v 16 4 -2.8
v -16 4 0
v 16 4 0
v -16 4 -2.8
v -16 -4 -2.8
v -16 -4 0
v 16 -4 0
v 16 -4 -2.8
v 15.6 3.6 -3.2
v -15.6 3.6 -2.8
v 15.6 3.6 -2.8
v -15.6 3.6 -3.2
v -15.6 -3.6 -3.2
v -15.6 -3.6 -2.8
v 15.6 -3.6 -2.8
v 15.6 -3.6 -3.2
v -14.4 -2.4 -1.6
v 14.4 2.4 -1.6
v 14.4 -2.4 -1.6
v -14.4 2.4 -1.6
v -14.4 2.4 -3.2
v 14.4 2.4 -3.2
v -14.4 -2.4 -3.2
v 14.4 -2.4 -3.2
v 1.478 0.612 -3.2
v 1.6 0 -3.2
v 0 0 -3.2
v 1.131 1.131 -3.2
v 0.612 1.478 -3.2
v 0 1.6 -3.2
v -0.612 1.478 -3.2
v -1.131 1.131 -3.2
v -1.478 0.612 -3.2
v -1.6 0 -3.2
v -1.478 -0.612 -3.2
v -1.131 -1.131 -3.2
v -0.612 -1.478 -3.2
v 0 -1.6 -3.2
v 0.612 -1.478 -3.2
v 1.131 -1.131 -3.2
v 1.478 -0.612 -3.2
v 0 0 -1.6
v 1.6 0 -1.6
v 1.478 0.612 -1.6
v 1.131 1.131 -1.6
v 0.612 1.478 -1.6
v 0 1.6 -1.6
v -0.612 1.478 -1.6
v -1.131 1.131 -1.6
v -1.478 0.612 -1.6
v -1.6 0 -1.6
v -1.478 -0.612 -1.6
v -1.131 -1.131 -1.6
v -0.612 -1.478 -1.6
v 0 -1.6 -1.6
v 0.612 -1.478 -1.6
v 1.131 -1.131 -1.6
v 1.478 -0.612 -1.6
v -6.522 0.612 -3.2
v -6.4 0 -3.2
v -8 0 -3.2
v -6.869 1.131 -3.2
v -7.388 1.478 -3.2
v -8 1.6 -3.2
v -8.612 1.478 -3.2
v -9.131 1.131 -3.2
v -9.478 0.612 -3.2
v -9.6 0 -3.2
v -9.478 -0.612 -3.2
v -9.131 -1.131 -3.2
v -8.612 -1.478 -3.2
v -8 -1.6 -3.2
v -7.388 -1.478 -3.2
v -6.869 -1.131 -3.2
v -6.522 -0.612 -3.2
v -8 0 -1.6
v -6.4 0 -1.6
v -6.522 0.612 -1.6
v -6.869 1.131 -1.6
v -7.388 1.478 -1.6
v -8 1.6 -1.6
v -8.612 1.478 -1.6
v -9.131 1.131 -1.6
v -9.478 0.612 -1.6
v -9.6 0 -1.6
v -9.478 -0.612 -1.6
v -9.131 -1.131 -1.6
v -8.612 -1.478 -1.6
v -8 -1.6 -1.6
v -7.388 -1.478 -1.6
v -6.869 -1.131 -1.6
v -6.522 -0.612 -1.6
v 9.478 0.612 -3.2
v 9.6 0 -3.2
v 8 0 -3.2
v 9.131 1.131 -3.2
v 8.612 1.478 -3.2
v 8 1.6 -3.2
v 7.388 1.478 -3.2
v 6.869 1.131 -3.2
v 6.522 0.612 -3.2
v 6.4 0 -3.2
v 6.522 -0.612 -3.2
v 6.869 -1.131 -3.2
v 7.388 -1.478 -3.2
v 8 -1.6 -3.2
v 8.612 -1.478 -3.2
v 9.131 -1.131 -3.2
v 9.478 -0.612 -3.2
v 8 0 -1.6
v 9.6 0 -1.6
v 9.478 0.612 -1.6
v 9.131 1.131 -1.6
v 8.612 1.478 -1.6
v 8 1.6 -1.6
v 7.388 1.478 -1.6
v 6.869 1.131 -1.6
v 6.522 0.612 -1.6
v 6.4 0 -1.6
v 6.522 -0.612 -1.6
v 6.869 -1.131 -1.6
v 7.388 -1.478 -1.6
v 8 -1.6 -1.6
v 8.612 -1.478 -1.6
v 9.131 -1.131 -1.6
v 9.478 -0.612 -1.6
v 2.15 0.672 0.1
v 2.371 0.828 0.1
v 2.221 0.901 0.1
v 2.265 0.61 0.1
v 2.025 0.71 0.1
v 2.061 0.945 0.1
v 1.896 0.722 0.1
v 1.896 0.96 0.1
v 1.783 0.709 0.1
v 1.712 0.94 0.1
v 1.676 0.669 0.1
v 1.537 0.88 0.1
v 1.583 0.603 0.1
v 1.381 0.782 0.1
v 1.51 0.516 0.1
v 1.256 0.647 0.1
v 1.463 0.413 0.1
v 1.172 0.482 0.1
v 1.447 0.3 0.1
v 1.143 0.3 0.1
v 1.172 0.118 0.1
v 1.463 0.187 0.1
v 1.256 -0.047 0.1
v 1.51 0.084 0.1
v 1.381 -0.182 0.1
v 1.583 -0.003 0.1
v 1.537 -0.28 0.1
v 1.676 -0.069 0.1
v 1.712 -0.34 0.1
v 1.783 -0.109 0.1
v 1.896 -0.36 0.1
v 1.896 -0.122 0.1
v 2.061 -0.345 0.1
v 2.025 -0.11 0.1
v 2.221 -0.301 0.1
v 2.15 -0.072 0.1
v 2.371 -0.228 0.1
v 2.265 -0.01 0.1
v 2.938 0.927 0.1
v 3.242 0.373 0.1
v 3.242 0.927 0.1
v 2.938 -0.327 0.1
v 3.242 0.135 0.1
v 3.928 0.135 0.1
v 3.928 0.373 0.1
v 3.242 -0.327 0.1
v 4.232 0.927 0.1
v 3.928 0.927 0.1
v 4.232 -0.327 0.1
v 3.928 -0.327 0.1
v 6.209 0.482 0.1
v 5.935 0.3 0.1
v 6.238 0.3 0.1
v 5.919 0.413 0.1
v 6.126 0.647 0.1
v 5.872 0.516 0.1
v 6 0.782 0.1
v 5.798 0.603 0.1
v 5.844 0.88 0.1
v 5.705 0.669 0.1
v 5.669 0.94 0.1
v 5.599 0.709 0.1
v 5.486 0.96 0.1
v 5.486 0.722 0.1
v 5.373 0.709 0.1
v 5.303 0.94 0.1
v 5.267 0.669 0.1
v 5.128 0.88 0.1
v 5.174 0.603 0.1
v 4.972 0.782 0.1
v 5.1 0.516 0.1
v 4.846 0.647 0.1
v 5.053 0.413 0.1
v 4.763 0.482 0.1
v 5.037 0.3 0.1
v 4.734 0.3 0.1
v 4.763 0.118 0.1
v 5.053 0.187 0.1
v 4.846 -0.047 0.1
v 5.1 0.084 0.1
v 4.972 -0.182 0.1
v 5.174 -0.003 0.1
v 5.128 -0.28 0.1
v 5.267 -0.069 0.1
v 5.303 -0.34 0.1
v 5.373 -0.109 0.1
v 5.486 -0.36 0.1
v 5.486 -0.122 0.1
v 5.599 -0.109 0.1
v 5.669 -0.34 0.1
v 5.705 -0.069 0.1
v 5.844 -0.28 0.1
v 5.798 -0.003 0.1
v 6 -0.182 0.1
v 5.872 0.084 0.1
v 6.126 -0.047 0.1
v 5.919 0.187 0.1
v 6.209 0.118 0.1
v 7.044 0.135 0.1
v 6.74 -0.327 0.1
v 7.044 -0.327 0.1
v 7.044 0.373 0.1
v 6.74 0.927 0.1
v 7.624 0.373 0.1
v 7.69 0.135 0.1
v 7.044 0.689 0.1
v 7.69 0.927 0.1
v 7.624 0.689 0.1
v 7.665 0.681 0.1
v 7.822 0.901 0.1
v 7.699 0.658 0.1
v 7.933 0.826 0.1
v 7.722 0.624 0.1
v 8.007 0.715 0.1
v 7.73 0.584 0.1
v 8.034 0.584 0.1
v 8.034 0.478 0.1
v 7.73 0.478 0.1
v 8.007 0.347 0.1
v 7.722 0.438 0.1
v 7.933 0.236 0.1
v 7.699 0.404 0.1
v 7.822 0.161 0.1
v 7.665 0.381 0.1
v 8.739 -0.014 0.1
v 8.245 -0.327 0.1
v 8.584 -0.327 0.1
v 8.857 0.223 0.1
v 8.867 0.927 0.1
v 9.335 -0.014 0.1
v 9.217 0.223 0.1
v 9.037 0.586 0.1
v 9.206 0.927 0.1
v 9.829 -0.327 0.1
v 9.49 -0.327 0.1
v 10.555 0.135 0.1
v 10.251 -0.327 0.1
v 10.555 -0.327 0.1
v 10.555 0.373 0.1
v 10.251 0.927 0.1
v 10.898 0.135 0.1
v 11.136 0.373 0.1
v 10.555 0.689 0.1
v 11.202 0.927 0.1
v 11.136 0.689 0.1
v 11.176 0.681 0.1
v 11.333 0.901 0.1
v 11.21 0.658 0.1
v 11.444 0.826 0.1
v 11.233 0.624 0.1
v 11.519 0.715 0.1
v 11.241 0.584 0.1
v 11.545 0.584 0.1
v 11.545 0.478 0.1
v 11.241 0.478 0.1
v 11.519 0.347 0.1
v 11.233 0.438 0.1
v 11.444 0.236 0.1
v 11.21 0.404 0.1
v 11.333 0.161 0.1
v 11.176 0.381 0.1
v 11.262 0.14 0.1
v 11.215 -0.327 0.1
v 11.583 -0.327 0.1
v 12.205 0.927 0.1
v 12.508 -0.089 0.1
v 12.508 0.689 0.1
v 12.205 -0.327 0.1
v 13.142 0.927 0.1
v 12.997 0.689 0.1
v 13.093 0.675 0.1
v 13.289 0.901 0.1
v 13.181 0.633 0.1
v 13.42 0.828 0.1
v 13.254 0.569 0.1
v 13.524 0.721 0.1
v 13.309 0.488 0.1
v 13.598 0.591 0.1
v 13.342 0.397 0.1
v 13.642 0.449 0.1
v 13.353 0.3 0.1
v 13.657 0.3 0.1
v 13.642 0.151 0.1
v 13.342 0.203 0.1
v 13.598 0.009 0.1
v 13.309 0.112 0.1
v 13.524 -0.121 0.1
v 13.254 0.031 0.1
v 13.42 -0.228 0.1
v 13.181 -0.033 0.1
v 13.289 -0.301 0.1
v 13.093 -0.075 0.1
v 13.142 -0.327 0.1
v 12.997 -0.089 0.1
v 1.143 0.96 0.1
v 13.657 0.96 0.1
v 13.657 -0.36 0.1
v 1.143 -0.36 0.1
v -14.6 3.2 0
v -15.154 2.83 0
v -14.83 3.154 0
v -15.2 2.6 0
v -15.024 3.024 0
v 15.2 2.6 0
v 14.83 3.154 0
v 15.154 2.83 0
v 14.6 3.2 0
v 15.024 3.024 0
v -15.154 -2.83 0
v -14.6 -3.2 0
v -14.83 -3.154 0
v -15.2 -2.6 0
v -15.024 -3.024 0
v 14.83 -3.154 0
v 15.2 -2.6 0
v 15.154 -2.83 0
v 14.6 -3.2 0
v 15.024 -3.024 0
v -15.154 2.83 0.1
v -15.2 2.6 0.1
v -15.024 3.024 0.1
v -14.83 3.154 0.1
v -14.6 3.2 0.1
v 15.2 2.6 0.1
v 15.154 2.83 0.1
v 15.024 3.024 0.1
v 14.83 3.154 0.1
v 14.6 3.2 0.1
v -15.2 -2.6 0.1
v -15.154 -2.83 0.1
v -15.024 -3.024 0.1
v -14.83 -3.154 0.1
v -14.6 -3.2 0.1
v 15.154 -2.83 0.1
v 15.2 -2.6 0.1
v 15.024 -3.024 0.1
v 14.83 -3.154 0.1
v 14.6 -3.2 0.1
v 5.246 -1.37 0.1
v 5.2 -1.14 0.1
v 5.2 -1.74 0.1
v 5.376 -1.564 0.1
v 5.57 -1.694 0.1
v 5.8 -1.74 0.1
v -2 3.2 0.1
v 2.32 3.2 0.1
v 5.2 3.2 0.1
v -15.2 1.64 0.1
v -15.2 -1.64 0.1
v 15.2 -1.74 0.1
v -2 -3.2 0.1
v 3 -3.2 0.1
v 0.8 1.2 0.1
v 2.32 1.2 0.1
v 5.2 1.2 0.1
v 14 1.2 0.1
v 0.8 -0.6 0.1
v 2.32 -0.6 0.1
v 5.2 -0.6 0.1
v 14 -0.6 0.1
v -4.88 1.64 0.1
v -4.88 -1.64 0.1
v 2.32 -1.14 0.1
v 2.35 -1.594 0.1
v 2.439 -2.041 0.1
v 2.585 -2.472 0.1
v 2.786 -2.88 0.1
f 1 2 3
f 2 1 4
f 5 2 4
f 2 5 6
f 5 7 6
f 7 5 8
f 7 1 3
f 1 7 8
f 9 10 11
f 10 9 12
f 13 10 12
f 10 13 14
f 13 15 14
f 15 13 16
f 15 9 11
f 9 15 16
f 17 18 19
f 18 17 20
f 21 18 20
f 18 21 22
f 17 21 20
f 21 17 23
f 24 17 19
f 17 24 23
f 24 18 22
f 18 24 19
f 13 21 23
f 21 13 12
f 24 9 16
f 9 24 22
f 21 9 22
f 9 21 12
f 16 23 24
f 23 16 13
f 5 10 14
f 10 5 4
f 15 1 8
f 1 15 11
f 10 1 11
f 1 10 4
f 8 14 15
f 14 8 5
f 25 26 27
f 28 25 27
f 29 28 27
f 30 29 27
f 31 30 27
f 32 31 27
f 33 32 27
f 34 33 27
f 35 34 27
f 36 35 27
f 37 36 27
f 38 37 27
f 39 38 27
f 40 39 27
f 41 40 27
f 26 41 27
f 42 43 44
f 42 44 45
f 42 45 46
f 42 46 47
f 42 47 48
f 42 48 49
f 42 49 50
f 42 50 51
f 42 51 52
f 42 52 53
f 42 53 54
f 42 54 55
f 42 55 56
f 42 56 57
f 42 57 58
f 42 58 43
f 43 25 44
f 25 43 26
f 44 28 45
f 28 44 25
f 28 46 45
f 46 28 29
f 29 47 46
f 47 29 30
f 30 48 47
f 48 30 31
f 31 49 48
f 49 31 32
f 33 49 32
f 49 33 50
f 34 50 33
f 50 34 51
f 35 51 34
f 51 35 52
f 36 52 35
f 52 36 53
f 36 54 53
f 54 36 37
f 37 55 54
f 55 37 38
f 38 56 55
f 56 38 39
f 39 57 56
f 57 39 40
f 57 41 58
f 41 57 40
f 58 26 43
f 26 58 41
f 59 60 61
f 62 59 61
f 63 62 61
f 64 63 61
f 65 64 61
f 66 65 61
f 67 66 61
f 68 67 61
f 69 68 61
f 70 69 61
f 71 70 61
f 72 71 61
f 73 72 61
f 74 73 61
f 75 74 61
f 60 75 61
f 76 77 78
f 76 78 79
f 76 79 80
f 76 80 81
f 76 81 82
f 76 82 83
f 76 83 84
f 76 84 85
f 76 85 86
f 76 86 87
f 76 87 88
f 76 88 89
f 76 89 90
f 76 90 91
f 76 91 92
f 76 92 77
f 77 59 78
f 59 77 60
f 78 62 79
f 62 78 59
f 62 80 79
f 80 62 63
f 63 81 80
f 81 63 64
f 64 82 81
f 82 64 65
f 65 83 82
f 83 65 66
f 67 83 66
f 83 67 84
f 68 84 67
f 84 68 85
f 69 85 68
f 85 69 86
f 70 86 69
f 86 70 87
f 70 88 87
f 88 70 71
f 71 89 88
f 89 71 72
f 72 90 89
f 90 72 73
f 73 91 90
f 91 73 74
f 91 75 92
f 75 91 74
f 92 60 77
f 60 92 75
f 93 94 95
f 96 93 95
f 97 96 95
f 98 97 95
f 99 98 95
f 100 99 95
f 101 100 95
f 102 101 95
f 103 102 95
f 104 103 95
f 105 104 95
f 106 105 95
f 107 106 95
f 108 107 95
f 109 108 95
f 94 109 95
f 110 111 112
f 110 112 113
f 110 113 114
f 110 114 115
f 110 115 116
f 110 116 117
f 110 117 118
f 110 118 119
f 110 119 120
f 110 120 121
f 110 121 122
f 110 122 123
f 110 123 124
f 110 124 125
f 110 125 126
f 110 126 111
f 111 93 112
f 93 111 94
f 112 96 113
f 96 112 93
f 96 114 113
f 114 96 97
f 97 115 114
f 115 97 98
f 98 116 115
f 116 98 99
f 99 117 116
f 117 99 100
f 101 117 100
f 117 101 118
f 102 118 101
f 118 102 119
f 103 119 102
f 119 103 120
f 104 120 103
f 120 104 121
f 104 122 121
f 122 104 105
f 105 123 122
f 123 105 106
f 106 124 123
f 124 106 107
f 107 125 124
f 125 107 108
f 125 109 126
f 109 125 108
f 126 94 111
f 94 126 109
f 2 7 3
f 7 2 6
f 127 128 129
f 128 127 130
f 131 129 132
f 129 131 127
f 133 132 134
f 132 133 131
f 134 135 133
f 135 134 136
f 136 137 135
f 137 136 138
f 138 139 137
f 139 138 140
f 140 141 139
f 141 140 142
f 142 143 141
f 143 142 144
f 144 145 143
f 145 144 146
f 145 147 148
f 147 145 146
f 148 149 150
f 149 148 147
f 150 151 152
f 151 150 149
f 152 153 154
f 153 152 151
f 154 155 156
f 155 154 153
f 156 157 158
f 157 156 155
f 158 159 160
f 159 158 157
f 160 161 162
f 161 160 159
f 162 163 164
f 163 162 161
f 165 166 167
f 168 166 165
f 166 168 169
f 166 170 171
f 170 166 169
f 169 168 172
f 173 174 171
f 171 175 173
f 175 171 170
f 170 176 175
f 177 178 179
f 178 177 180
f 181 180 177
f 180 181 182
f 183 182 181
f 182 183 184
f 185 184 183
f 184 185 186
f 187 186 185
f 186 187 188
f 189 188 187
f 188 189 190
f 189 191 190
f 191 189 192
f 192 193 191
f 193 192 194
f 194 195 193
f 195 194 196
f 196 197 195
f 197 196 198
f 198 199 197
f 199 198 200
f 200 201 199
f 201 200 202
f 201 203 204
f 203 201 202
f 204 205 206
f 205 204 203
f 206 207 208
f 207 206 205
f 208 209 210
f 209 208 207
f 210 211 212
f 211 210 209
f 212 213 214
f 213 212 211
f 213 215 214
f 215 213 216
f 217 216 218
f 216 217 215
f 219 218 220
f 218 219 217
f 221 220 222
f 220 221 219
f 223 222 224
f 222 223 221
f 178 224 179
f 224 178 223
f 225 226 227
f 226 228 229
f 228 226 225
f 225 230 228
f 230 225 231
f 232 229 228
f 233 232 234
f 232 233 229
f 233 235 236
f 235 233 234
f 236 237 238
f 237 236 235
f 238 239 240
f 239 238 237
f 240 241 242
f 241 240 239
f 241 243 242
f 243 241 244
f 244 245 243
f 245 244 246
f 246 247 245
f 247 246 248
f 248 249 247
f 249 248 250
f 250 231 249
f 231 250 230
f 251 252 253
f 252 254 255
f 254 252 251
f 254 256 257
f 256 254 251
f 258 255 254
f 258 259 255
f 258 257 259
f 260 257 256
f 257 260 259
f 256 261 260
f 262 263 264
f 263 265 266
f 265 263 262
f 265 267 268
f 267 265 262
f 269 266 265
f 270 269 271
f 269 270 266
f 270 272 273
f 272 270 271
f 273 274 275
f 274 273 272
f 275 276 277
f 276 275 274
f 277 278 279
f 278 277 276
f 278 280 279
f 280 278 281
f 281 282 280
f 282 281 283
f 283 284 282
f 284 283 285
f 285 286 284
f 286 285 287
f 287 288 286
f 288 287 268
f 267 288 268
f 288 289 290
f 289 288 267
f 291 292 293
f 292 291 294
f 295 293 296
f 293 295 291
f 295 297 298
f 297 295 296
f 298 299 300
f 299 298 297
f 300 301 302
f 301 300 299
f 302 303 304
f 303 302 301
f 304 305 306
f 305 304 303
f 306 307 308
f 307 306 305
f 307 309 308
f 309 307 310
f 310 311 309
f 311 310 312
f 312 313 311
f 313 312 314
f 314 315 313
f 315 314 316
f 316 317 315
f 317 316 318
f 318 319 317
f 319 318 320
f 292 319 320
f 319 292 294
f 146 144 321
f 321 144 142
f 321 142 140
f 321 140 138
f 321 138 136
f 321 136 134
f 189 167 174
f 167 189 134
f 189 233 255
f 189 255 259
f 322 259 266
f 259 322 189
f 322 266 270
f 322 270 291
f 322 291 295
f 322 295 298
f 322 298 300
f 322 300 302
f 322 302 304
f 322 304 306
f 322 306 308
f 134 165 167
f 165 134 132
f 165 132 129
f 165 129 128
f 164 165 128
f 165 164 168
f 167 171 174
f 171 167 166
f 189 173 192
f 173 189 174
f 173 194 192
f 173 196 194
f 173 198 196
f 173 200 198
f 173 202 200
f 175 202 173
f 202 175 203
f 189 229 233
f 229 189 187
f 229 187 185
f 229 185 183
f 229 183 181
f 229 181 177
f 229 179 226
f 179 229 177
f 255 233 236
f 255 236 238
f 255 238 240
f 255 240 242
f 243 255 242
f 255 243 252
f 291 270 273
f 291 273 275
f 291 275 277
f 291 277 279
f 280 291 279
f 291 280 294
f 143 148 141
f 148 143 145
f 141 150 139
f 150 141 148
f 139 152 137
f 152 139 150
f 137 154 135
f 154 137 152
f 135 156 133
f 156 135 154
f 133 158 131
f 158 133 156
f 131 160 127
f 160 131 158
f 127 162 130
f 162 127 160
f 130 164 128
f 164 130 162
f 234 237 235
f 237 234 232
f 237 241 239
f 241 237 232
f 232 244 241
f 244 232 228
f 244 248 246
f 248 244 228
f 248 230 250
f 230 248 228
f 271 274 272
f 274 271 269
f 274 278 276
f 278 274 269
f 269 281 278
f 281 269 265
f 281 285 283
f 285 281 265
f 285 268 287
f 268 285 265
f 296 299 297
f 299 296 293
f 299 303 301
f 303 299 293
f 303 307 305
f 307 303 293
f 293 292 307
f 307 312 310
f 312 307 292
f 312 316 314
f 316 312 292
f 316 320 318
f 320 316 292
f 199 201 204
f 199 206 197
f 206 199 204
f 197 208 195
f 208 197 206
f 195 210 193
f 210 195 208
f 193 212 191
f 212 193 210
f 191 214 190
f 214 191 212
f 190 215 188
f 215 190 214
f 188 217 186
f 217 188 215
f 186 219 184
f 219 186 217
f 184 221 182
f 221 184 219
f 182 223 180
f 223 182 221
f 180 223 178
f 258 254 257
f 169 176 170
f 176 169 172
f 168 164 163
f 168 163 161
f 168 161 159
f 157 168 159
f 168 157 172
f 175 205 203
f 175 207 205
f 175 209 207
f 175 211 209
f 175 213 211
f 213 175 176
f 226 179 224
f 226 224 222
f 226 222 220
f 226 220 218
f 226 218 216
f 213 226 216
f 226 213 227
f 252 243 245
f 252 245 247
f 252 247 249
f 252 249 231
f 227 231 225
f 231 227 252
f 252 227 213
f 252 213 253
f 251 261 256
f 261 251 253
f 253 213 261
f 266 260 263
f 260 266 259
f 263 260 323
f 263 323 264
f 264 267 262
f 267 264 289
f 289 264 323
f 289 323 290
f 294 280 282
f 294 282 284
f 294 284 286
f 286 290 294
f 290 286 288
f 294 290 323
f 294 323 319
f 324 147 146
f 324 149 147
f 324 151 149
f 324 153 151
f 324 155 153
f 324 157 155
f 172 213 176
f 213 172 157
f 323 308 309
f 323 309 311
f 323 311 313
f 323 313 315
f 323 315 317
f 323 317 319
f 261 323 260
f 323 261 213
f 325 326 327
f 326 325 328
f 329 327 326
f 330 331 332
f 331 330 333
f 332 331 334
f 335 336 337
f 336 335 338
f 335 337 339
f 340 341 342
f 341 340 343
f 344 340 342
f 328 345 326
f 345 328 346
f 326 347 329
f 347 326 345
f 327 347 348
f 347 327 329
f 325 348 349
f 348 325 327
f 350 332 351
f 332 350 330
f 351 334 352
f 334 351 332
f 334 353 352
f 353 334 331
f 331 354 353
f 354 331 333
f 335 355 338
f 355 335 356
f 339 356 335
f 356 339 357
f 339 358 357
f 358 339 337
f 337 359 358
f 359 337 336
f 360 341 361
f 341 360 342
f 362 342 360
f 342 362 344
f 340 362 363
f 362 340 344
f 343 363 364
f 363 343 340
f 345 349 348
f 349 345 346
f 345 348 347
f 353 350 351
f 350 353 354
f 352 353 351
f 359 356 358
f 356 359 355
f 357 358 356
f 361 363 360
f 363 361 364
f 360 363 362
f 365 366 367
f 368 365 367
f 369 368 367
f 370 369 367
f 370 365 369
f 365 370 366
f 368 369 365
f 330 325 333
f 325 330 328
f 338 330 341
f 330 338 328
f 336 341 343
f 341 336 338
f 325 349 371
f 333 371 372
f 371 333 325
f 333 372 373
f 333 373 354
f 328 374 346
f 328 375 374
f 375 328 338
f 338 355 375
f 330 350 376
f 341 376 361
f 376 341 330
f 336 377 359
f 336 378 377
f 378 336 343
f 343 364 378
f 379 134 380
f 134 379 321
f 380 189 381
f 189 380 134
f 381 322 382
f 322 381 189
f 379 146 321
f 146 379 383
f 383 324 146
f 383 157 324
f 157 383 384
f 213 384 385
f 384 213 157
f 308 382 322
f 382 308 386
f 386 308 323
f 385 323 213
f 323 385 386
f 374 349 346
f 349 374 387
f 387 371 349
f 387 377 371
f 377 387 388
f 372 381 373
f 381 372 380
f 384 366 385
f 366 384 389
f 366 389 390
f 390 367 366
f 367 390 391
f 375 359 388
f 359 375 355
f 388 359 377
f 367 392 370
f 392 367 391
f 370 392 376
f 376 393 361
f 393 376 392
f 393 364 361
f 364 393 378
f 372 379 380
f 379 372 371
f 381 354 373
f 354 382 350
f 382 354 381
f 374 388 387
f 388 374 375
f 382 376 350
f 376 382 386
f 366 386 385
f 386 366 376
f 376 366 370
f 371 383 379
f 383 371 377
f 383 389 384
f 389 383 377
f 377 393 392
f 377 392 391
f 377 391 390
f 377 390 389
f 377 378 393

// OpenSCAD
use <../lib.scad>
use <2431.scad>
use <6148328an.scad>
function ldraw_lib__2431d0z() = [
// 0 Tile  1 x  4 with White "CHOPARD" and Dark Grey Lines on White Background Right Sticker
// 0 Name: 2431d0z.dat
// 0 Author: Vincent Messenet [Cheenzo]
// 0 !LDRAW_ORG Shortcut UPDATE 2026-05
// 0 !LICENSE Licensed under CC BY 4.0 : see CAreadme.txt
// 
// 0 BFC CERTIFY CCW
  [0,"BFC","CERTIFY"],
  [0,"BFC","CCW"],
// 
// 0 !CATEGORY Sticker Shortcut
// 
// 0 !KEYWORDS Bricklink 2431pb0553R, Porsche 919 Hybrid and 917K Pit Lane
// 0 !KEYWORDS set 75876, Speed Champions
// 
// 0 !HISTORY 2026-05-31 [OrionP] Official Update 2026-05
// 
// 1 16 0 0 0 1 0 0 0 1 0 0 0 1 2431.dat
  [1,16,0,0,0,1,0,0,0,1,0,0,0,1, ldraw_lib__2431()],
// 1 16 0 0 0 1 0 0 0 1 0 0 0 1 6148328an.dat
  [1,16,0,0,0,1,0,0,0,1,0,0,0,1, ldraw_lib__6148328an()],
];
module ldraw_lib__2431d0z(step=0, col=false, unit=2/5, alt=false, line=0.2, solid=!$preview)
    makepoly(ldraw_lib__2431d0z(), step=step, col=col, unit=unit, alt=alt, line=line, solid=solid);
ldraw_lib__2431d0z(line=0.2);
